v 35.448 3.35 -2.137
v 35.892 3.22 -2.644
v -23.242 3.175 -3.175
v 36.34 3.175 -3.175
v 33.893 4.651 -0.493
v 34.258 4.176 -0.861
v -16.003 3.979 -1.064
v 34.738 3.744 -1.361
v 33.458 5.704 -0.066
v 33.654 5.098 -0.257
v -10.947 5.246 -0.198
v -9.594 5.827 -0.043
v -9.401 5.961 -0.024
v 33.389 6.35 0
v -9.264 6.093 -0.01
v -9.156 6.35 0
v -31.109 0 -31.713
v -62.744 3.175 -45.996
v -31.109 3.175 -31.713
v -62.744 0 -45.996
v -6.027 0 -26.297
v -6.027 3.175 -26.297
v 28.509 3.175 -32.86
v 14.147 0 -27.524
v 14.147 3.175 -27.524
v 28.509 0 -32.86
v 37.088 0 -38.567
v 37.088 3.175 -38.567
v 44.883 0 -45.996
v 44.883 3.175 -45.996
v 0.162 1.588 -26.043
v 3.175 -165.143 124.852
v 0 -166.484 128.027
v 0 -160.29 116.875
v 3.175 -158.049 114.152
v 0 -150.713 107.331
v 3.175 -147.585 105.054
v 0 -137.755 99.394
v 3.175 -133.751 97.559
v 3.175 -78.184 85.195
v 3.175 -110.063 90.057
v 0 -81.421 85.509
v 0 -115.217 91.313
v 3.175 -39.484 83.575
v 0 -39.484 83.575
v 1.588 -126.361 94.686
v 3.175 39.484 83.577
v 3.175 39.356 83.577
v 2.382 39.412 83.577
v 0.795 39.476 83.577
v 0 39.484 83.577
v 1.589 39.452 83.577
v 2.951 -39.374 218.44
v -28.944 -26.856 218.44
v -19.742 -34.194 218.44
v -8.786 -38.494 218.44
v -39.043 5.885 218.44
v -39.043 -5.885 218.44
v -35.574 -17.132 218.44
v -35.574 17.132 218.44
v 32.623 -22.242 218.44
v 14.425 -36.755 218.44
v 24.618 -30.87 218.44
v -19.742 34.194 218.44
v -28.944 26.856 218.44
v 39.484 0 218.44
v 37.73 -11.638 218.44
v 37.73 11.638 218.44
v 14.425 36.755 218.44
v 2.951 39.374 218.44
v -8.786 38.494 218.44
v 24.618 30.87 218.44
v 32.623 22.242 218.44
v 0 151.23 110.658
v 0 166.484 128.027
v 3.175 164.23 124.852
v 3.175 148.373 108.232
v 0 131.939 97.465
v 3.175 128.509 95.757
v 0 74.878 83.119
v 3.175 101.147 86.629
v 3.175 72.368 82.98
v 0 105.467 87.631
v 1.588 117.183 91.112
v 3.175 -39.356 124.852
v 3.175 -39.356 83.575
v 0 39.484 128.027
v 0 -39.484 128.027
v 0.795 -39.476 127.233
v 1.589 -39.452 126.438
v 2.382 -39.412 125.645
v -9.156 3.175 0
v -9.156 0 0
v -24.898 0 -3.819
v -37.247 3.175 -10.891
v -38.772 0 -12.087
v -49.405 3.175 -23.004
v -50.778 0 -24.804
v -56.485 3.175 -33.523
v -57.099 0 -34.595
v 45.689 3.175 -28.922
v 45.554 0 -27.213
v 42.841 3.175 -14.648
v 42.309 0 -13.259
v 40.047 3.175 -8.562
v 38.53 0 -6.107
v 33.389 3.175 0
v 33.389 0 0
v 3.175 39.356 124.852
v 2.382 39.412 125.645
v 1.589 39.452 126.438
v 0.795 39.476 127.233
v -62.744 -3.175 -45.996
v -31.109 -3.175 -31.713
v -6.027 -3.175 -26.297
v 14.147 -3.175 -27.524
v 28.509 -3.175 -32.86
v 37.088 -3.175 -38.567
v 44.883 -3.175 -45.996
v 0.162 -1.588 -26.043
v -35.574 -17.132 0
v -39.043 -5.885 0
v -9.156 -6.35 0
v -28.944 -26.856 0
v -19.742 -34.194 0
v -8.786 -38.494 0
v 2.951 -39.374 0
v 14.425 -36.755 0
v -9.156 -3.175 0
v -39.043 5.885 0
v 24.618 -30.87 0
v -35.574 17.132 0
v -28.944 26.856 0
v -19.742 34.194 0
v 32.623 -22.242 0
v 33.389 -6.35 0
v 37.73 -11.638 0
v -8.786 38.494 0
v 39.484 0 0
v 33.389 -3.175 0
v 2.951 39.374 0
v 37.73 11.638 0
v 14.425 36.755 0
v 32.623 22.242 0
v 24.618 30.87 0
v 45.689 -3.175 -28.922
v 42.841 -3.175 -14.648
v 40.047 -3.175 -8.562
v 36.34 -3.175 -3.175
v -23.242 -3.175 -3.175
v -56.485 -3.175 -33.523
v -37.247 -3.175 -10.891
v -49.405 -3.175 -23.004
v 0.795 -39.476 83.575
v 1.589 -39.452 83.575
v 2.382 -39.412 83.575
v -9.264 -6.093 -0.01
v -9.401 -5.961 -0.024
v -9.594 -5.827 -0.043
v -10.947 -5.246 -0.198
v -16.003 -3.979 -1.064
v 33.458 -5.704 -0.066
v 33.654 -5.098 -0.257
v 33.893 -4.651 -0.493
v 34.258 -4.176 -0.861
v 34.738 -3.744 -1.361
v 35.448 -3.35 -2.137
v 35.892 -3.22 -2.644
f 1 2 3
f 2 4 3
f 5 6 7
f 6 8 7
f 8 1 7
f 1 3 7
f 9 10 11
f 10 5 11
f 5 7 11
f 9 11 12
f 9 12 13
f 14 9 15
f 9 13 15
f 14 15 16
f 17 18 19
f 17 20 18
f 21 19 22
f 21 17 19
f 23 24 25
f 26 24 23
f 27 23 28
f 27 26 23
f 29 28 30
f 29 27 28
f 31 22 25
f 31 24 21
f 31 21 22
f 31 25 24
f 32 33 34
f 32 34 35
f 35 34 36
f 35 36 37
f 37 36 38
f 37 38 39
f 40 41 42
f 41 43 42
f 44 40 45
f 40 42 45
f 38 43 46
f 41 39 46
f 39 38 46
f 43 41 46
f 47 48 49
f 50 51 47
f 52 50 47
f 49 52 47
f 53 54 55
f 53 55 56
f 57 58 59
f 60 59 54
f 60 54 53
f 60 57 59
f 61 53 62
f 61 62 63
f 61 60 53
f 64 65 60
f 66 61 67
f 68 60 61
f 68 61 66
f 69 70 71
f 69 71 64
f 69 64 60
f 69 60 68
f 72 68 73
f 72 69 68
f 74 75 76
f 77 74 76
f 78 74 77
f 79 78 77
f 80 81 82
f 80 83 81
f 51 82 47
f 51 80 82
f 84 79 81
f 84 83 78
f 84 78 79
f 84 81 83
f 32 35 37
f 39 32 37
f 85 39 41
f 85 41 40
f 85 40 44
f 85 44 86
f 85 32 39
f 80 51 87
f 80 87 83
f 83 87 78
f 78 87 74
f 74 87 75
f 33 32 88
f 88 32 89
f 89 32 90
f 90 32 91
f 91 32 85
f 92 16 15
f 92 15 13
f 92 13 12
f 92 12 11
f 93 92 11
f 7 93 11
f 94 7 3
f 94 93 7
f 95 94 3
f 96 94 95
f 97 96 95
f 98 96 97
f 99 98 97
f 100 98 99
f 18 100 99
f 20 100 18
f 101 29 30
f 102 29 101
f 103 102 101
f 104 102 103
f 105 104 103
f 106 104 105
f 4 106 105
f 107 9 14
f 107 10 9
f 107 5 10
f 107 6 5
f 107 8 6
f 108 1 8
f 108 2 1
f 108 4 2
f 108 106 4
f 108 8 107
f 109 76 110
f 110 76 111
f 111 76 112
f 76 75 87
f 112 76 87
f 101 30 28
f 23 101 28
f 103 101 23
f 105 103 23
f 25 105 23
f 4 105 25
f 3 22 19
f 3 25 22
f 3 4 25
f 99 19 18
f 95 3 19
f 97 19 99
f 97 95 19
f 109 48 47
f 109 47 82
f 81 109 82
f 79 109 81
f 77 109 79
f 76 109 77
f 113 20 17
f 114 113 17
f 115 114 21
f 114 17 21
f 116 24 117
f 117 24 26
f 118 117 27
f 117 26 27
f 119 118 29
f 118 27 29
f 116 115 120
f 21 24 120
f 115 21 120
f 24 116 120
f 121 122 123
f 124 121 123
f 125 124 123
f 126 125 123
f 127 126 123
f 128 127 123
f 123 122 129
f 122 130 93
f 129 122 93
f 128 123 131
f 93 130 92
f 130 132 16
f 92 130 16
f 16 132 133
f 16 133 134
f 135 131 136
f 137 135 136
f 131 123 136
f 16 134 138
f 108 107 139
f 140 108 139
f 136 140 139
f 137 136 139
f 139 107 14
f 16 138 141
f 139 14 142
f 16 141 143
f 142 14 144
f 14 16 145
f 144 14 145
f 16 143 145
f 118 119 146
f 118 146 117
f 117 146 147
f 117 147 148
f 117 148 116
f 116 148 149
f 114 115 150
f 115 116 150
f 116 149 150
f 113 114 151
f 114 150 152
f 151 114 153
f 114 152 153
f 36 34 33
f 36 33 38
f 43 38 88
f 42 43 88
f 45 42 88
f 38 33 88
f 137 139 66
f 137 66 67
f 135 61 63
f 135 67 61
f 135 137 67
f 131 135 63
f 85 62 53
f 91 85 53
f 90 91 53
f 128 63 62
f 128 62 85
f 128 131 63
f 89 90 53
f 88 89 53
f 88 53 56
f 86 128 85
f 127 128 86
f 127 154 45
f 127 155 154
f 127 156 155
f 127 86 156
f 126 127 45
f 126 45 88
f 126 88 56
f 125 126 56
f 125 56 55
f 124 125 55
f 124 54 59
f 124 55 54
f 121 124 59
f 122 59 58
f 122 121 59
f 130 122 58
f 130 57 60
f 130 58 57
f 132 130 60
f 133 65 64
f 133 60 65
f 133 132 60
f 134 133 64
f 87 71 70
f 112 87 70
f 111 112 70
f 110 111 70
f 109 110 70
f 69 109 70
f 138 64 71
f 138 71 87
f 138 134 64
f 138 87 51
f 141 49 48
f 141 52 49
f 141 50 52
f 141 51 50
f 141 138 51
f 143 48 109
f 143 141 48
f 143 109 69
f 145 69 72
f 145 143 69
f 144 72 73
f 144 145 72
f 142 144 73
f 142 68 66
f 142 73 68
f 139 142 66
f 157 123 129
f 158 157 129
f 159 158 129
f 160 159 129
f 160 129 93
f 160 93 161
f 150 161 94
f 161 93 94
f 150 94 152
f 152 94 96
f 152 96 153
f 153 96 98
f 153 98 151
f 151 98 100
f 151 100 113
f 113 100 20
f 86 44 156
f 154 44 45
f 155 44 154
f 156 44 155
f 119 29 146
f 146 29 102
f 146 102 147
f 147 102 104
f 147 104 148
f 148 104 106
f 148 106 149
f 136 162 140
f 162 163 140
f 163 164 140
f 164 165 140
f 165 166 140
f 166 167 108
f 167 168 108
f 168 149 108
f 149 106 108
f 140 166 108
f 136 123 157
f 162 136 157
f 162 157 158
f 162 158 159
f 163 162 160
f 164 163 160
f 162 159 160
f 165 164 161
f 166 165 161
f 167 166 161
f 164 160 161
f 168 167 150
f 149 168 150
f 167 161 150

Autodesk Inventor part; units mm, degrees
ref_plane "YZ Plane" through (0, 0, 0) normal (1, 0, 0) x (0, 1, 0)
ref_plane "XZ Plane" through (0, 0, 0) normal (0, 1, 0) x (-1, 0, 0)
ref_plane "XY Plane" through (0, 0, 0) normal (0, 0, 1) x (1, 0, 0)
sketch "Sketch1" plane through (0, 0, 0) normal (0, 0, 1) x (1, 0, 0)
  circle A0 centre (0, 0) radius 39.4843
  dimension "d0" = 78.9686
extrude "Extrusion1" add sketch "Sketch1" along normal blind 218.44
sketch "Sketch2" plane through (0, 0, 0) normal (1, 0, 0) x (0, 1, 0)
  line L0 (39.4843, 0) -> (39.4843, 218.44)
  line L1 (39.4843, 83.5771) -> (39.4843, 128.0271)
  line L2 (39.4843, 128.0271) -> (166.4843, 128.0271)
  line L3 (166.4843, 128.0271) -> (131.3819, 76.4226) construction
  line L4 (131.3819, 76.4226) -> (39.4843, 83.5771) construction
  spline S0 degree 2 poles (166.4843, 128.0271) (131.3819, 76.4226) (39.4843, 83.5771) knots 1 1 1 2 2 2
  line L5 (-39.4843, 83.5747) -> (-39.4843, 128.0271)
  line L6 (-39.4843, 0) -> (-39.4843, 218.44) projected
  line L7 (-39.4843, 83.5747) -> (-39.4843, 128.0271)
  line L8 (-39.4843, 128.0271) -> (-166.4843, 128.0271)
  line L9 (-166.4843, 128.0271) -> (-149.7384, 83.5714) construction
  line L10 (-149.7384, 83.5714) -> (-39.4843, 83.5747) construction
  spline S1 degree 2 poles (-166.4843, 128.0271) (-149.7384, 83.5714) (-39.4843, 83.5747) knots 1 1 1 2 2 2
  line L11 (-39.4843, 128.0271) -> (48.468, 128.0271)
  line L12 (-39.4843, 83.5747) -> (39.4843, 83.5771)
  line L13 (-54.9885, 128.0271) -> (39.4843, 128.0271)
  line L14 (39.4843, 0) -> (39.4843, 218.44) projected
  line L15 (-39.4843, 83.5747) -> (39.4843, 83.5771)
  point P0 (0, 0)
  dimension "d3" = 44.45
  dimension "d4" = 127
  dimension "d5" = 127
extrude "Extrusion2" add sketch "Sketch2" along normal blind 3.175
chamfer "Chamfer1" distance 3.175 angle 45 1 edges at (3.175, -102.9204, 128.0271)
chamfer "Chamfer2" distance 3.175 angle 45 1 edges at (3.175, 102.9204, 128.0271)
sketch "Sketch3" plane through (0, 0, 0) normal (0, 1, 0) x (-1, 0, 0)
  line L0 (-39.4843, 0) -> (39.4843, 0) projected
  line L1 (-33.3888, 0) -> (9.1562, 0)
  line L2 (9.1562, 0) -> (44.2001, -3.3503) construction
  line L3 (44.2001, -3.3503) -> (62.7444, -45.9959) construction
  spline S0 degree 2 poles (9.1562, 0) (44.2001, -3.3503) (62.7444, -45.9959) knots 1 1 1 2 2 2
  line L4 (62.7444, -45.9959) -> (-9.2544, -6.0902) construction
  line L5 (-9.2544, -6.0902) -> (-44.8829, -45.9959) construction
  spline S1 degree 2 poles (62.7444, -45.9959) (-9.2544, -6.0902) (-44.8829, -45.9959) knots 1 1 1 2 2 2
  line L6 (-44.8829, -45.9959) -> (-49.2667, -15.2331) construction
  line L7 (-49.2667, -15.2331) -> (-33.3888, 0) construction
  spline S2 degree 2 poles (-44.8829, -45.9959) (-49.2667, -15.2331) (-33.3888, 0) knots 1 1 1 2 2 2
  point P0 (0, 0)
  dimension "d14" = 42.545
extrude "Extrusion3" add sketch "Sketch3" along normal mid plane 6.35
fillet "Fillet1" radius 3.175 1 edges at (12.1163, 3.175, 0)
fillet "Fillet2" radius 3.175 1 edges at (12.1163, -3.175, 0)
sketch "Sketch4" plane through (0, 0, 218.44) normal (0, 0, 1) x (1, 0, 0)
  point P0 (0, 0)
properties part number "wings"
